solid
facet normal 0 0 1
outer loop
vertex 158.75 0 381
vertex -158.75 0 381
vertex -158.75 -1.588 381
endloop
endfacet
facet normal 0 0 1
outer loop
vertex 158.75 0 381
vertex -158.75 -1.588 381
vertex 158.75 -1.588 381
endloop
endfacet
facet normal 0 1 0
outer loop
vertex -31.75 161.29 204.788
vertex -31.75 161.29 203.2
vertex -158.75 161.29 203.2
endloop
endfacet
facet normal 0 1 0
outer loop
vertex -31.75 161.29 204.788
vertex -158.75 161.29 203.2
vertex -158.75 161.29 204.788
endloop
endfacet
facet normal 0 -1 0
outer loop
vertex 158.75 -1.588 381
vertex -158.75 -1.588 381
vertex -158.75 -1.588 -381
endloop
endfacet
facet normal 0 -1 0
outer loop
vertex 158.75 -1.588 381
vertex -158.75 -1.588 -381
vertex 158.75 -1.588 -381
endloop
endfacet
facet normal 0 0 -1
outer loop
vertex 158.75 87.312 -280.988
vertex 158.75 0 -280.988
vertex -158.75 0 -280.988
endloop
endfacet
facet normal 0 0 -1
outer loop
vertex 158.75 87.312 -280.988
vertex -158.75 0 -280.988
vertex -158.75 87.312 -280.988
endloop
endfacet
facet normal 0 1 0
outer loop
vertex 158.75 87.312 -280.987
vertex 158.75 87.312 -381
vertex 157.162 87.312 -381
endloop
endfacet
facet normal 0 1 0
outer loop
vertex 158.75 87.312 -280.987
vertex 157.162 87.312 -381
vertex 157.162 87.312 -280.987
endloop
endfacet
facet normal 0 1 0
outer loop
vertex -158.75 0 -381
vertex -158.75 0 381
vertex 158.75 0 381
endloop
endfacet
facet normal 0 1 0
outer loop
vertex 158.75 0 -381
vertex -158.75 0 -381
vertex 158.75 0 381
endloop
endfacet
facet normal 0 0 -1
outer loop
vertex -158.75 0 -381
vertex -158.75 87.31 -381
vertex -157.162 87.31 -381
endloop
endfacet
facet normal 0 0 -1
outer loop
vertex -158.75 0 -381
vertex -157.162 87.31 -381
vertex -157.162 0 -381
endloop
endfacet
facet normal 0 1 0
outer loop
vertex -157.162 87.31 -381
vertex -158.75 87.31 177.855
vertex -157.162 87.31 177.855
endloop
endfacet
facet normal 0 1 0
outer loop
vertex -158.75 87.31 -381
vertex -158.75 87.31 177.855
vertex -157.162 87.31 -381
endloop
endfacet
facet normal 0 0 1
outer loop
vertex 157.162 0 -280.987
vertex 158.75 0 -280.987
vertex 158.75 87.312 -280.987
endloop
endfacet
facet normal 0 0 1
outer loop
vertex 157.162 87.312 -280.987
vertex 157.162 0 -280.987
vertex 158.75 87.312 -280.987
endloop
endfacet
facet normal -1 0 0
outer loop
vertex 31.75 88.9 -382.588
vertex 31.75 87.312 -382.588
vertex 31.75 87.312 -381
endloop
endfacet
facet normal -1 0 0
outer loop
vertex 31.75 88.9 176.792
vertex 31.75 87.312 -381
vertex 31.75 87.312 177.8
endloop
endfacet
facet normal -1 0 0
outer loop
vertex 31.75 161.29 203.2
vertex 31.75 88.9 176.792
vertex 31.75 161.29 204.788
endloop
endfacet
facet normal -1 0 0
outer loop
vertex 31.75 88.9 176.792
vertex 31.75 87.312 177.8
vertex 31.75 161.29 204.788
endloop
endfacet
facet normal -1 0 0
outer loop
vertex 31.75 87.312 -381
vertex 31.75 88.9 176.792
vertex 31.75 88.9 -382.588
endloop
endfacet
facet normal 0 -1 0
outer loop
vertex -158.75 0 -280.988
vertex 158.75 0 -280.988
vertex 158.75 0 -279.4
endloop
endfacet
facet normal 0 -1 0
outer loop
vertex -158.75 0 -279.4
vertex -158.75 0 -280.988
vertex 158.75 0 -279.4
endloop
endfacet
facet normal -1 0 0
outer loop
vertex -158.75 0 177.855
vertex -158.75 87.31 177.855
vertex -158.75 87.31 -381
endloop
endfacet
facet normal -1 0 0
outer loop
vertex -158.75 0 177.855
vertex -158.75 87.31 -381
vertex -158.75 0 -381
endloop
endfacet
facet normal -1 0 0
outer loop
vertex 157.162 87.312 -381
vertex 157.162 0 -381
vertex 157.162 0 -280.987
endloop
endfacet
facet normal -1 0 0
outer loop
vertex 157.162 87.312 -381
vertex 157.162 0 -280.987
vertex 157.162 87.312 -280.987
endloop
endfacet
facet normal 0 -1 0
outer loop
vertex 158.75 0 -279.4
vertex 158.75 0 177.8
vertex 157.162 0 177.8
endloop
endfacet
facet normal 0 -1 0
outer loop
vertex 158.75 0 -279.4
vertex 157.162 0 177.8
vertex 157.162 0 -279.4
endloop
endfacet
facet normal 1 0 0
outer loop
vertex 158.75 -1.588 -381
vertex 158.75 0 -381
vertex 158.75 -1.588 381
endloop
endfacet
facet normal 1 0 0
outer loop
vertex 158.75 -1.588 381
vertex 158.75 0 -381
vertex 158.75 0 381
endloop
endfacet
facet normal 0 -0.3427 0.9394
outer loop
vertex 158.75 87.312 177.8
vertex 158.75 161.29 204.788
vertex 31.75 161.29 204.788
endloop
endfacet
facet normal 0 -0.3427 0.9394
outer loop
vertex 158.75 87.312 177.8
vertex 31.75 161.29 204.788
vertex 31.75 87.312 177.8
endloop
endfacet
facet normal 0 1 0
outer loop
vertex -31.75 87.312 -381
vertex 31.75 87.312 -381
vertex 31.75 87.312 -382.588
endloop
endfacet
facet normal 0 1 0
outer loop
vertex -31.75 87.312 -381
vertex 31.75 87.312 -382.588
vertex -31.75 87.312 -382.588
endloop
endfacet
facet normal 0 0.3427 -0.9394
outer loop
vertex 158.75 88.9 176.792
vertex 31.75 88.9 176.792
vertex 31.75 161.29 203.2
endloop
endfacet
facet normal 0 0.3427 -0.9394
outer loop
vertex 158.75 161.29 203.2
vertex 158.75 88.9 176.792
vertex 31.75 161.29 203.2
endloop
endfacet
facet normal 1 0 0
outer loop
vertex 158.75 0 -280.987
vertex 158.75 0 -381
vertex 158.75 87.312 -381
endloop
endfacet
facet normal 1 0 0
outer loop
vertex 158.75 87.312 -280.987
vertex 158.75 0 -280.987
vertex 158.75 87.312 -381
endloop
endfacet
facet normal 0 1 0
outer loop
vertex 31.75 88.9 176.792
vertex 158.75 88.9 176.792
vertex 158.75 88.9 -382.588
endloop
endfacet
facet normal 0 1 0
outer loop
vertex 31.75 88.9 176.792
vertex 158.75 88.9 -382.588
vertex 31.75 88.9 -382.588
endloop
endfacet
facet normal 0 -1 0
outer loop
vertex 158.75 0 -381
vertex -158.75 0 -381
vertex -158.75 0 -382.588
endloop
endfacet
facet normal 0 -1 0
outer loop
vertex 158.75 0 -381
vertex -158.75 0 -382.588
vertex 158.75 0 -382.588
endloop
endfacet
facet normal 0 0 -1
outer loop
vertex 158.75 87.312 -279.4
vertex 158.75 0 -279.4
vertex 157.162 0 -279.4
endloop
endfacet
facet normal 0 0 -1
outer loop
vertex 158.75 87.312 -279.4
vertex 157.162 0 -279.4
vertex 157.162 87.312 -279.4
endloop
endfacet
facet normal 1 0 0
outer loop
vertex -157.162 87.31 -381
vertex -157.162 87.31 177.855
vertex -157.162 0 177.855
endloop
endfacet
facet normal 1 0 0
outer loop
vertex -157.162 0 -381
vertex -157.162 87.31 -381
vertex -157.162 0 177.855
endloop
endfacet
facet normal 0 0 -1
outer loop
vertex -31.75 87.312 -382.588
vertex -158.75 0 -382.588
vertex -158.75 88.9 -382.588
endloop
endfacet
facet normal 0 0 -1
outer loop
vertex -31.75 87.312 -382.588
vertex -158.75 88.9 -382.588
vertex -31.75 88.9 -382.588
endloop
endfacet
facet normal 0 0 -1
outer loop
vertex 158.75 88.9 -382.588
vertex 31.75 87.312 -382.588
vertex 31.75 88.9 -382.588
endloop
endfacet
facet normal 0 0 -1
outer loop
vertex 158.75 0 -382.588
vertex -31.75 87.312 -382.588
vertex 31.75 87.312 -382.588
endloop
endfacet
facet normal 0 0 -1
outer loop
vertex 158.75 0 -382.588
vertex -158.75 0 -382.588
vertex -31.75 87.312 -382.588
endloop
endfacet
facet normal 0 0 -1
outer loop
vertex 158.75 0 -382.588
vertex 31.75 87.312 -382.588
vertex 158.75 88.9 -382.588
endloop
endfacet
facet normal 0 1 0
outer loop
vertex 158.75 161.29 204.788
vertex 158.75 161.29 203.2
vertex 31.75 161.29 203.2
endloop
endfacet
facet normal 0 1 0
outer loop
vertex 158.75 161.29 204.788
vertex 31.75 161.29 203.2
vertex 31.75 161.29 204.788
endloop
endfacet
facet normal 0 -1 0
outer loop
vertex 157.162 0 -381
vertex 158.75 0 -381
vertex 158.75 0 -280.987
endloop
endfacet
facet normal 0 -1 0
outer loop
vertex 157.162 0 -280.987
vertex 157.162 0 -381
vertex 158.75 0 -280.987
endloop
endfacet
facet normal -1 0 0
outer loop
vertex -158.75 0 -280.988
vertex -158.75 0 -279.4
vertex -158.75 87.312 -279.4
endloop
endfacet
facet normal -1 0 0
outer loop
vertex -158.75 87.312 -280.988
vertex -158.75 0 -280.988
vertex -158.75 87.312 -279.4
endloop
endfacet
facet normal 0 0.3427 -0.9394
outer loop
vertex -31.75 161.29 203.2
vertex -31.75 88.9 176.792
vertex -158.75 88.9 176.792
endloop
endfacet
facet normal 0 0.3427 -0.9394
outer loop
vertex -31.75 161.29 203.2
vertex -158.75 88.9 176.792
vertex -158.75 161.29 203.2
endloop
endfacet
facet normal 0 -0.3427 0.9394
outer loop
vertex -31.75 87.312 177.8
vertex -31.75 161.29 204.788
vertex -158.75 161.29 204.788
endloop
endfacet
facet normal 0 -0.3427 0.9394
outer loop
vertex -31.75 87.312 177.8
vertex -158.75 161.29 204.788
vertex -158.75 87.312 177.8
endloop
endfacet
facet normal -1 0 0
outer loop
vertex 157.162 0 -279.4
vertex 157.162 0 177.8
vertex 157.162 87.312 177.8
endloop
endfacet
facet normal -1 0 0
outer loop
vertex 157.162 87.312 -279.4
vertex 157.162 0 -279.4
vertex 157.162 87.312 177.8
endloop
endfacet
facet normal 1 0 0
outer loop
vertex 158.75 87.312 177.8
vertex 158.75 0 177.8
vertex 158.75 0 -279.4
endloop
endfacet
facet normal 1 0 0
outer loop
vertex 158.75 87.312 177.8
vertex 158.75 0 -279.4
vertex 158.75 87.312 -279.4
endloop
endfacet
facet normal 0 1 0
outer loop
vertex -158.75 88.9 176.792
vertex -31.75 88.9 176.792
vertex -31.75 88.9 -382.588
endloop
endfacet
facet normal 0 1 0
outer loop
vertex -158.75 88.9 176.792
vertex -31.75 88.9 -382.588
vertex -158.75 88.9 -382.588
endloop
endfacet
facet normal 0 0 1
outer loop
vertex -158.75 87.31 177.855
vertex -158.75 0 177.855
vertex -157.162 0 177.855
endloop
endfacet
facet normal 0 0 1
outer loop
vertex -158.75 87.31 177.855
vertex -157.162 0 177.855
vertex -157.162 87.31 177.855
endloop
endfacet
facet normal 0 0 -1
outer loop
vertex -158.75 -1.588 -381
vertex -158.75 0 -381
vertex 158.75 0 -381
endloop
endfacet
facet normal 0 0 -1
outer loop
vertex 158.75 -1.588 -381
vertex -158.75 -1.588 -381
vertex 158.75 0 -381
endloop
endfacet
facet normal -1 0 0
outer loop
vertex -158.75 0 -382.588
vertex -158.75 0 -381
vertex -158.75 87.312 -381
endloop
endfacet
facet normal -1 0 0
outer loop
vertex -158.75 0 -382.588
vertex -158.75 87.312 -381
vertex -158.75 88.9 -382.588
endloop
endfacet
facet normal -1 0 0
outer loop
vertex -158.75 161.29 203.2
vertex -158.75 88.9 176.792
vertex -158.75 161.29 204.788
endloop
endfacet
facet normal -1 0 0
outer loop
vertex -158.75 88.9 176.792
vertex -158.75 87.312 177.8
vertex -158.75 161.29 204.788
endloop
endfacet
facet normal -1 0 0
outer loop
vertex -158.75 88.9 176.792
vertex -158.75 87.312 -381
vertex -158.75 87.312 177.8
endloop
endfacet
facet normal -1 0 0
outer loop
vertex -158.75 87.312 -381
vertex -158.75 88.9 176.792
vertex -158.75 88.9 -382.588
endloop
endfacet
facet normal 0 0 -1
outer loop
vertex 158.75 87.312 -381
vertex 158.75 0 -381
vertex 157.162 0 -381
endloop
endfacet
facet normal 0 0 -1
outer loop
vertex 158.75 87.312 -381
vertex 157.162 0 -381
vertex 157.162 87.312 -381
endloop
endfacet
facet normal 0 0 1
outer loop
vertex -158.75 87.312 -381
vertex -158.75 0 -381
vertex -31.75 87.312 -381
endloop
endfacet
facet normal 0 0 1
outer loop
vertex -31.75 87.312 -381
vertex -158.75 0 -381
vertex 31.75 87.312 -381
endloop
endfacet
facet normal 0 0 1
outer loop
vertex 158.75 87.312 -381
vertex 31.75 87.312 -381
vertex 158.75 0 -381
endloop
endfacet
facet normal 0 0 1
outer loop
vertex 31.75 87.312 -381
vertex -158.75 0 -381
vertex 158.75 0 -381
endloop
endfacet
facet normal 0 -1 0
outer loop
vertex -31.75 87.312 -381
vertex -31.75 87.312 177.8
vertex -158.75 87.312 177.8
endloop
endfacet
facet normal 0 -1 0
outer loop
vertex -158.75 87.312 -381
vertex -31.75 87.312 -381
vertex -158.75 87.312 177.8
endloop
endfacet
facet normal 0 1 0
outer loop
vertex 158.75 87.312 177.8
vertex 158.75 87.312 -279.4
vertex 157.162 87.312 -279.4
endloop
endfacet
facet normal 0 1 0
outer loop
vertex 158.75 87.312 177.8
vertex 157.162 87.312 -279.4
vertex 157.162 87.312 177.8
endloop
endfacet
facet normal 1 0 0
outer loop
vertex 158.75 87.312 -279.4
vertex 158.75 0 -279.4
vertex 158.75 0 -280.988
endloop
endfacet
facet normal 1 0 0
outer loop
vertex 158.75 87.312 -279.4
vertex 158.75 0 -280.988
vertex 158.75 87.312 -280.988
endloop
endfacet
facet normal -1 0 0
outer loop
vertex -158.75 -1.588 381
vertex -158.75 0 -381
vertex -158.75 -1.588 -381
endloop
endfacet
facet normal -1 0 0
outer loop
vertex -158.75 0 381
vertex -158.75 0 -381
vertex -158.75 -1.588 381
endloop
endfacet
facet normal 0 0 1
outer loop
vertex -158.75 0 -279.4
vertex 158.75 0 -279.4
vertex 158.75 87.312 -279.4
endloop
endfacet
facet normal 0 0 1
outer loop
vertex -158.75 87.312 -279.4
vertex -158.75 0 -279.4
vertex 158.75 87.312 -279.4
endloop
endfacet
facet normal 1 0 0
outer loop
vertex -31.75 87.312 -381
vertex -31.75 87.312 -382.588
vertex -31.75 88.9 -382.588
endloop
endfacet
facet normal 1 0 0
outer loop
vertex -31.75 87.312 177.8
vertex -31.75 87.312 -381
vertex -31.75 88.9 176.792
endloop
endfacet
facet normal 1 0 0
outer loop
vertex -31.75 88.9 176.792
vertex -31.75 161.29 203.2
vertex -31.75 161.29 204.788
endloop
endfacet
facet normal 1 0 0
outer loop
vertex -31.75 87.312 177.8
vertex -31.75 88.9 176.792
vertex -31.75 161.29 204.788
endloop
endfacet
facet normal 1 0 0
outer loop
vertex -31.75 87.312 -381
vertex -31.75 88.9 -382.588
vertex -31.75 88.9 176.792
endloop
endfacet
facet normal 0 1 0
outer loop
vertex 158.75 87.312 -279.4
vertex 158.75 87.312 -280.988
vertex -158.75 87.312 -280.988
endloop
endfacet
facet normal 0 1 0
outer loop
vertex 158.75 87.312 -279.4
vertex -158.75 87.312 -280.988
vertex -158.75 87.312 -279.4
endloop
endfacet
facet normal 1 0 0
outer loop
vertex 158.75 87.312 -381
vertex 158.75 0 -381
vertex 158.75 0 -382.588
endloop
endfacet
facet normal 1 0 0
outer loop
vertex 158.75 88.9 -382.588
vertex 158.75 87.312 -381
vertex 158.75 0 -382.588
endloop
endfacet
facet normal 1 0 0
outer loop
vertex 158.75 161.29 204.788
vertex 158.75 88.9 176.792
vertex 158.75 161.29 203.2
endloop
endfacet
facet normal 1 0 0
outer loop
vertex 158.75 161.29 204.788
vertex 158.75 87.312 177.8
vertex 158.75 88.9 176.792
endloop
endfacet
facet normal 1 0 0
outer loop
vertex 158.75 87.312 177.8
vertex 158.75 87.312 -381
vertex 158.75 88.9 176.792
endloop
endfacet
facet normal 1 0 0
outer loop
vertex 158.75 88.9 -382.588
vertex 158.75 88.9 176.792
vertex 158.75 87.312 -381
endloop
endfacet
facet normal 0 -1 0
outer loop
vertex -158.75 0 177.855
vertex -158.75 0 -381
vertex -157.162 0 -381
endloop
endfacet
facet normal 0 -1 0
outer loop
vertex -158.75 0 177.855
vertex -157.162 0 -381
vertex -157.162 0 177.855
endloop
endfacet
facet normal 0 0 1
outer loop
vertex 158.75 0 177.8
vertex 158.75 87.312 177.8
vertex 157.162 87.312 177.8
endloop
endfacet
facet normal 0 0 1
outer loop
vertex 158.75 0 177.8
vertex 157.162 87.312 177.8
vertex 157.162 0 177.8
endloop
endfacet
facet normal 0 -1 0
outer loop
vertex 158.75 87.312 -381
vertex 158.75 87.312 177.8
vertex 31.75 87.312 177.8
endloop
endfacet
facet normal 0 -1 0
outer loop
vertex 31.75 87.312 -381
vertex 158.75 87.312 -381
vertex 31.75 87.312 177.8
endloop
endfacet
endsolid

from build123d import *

# Parameters (mm, degrees)
F0_W      = 317.5
F0_H      = 762
F1_DEPTH  = 1.5875
F2_W      = 317.5
F2_H      = 88.9
F3_DEPTH  = 1.5875
F4_W      = 317.5
F4_H      = 558.8
F5_DEPTH  = 1.5875
F7_DEPTH  = 317.5
F8_DEPTH  = 1.5875
F11_DEPTH = 1.5875
F12_W     = 31.75
F12_H     = 78.7464009495
F13_DEPTH = 1.5875
F15_DEPTH = 2.54
F16_DEPTH = 1.5875
F6_W      = 87.3125
F6_H      = 1.5875
F17_DEPTH = 317.5
F6_H_2    = 100.0125
F18_DEPTH = 1.5875


# Not quite as in the source:
# - a length typed as a fraction of an inch, garbled in the dataset ("3 / 203.2 mm" for 3/8 in), is restored


with BuildPart() as f1:
    # F0 (on Front) → F1 (new body)
    with BuildSketch(Plane.XZ):
        Rectangle(F0_W, F0_H)
    extrude(amount=F1_DEPTH)


with BuildPart() as f3:
    # F2 (on face) → F3 (new body)
    with BuildSketch(Plane(origin=(0, 0, -381), x_dir=(1, 0, 0), z_dir=(0, 0, -1))):
        with Locations((0, -44.45)):
            Rectangle(F2_W, F2_H)
    extrude(amount=F3_DEPTH)

    # F4 (on face) → F5 (join)
    with BuildSketch(Plane(origin=(0, 88.9, 0), x_dir=(-1, 0, 0), z_dir=(0, 1, 0))):
        with Locations((0, -101.6)):
            Rectangle(F4_W, F4_H)
    extrude(amount=-F5_DEPTH)

    # F6 (on face) → F7 (join)
    with BuildSketch(Plane.YZ.offset(158.75)):
        Polygon((161.29, 204.7875), (87.3125, 177.8), (88.9, 177.8), (88.9, 176.7916309013), (161.29, 203.2), align=None)
    extrude(amount=-F7_DEPTH)

    # F12 (on face) → F13 (cut)
    with BuildSketch(Plane(origin=(0, -46.9892412703, 128.8058025409), x_dir=(1, 0, 0), z_dir=(0, -0.3427140755, 0.9394397599))):
        with Locations((15.875, 182.332597133)):
            Rectangle(F12_W, F12_H)
        with Locations((-15.875, 182.332597133)):
            Rectangle(F12_W, F12_H)
    extrude(amount=-F13_DEPTH, mode=Mode.SUBTRACT)

    # F15 (cut): a face of the model
    f15_faces = [f3.faces().sort_by_distance(p)[0] for p in [
        (0, 87.5845292974, 177.0543196906),
    ]]
    extrude(f15_faces, amount=-F15_DEPTH, mode=Mode.SUBTRACT)

    # F14 (on face) → F16 (cut)
    with BuildSketch(Plane(origin=(0, 88.9, 0), x_dir=(-1, 0, 0), z_dir=(0, 1, 0))):
        Polygon((31.75, 176.689293971), (0, 176.689293971), (-31.75, 176.689293971), (-31.75, -382.5875), (0, -382.5875), (31.75, -382.5875), align=None)
    extrude(amount=-F16_DEPTH, mode=Mode.SUBTRACT)


with BuildPart() as f8:
    # F6 (on face) → F8 (new body)
    with BuildSketch(Plane.YZ.offset(158.75)):
        Polygon((87.3125, 176.2125), (87.3125, 177.8), (0, 177.8), (0, -279.4), (87.3125, -279.4), align=None)
    extrude(amount=-F8_DEPTH)


with BuildPart() as f11:
    # F10 (on face) → F11 (new body)
    with BuildSketch(Plane(origin=(-158.75, 0, 0), x_dir=(0, -1, 0), z_dir=(-1, 0, 0))):
        Polygon((0, -381), (0, 177.8553873301), (-87.3104333878, 177.8553873301), (-87.3104333878, -381.0001015663), (0, -381.0001015663), align=None)
    extrude(amount=-F11_DEPTH)


with BuildPart() as f17:
    # F6 (on face) → F17 (new body)
    with BuildSketch(Plane.YZ.offset(158.75)):
        with Locations((43.65625, -280.19375)):
            Rectangle(F6_W, F6_H)
    extrude(amount=-F17_DEPTH)


with BuildPart() as f18:
    # F6 (on face) → F18 (new body)
    with BuildSketch(Plane.YZ.offset(158.75)):
        with Locations((43.65625, -330.99375)):
            Rectangle(F6_W, F6_H_2)
    extrude(amount=-F18_DEPTH)


solid = Compound([f1.part, f3.part, f8.part, f11.part, f17.part, f18.part])
